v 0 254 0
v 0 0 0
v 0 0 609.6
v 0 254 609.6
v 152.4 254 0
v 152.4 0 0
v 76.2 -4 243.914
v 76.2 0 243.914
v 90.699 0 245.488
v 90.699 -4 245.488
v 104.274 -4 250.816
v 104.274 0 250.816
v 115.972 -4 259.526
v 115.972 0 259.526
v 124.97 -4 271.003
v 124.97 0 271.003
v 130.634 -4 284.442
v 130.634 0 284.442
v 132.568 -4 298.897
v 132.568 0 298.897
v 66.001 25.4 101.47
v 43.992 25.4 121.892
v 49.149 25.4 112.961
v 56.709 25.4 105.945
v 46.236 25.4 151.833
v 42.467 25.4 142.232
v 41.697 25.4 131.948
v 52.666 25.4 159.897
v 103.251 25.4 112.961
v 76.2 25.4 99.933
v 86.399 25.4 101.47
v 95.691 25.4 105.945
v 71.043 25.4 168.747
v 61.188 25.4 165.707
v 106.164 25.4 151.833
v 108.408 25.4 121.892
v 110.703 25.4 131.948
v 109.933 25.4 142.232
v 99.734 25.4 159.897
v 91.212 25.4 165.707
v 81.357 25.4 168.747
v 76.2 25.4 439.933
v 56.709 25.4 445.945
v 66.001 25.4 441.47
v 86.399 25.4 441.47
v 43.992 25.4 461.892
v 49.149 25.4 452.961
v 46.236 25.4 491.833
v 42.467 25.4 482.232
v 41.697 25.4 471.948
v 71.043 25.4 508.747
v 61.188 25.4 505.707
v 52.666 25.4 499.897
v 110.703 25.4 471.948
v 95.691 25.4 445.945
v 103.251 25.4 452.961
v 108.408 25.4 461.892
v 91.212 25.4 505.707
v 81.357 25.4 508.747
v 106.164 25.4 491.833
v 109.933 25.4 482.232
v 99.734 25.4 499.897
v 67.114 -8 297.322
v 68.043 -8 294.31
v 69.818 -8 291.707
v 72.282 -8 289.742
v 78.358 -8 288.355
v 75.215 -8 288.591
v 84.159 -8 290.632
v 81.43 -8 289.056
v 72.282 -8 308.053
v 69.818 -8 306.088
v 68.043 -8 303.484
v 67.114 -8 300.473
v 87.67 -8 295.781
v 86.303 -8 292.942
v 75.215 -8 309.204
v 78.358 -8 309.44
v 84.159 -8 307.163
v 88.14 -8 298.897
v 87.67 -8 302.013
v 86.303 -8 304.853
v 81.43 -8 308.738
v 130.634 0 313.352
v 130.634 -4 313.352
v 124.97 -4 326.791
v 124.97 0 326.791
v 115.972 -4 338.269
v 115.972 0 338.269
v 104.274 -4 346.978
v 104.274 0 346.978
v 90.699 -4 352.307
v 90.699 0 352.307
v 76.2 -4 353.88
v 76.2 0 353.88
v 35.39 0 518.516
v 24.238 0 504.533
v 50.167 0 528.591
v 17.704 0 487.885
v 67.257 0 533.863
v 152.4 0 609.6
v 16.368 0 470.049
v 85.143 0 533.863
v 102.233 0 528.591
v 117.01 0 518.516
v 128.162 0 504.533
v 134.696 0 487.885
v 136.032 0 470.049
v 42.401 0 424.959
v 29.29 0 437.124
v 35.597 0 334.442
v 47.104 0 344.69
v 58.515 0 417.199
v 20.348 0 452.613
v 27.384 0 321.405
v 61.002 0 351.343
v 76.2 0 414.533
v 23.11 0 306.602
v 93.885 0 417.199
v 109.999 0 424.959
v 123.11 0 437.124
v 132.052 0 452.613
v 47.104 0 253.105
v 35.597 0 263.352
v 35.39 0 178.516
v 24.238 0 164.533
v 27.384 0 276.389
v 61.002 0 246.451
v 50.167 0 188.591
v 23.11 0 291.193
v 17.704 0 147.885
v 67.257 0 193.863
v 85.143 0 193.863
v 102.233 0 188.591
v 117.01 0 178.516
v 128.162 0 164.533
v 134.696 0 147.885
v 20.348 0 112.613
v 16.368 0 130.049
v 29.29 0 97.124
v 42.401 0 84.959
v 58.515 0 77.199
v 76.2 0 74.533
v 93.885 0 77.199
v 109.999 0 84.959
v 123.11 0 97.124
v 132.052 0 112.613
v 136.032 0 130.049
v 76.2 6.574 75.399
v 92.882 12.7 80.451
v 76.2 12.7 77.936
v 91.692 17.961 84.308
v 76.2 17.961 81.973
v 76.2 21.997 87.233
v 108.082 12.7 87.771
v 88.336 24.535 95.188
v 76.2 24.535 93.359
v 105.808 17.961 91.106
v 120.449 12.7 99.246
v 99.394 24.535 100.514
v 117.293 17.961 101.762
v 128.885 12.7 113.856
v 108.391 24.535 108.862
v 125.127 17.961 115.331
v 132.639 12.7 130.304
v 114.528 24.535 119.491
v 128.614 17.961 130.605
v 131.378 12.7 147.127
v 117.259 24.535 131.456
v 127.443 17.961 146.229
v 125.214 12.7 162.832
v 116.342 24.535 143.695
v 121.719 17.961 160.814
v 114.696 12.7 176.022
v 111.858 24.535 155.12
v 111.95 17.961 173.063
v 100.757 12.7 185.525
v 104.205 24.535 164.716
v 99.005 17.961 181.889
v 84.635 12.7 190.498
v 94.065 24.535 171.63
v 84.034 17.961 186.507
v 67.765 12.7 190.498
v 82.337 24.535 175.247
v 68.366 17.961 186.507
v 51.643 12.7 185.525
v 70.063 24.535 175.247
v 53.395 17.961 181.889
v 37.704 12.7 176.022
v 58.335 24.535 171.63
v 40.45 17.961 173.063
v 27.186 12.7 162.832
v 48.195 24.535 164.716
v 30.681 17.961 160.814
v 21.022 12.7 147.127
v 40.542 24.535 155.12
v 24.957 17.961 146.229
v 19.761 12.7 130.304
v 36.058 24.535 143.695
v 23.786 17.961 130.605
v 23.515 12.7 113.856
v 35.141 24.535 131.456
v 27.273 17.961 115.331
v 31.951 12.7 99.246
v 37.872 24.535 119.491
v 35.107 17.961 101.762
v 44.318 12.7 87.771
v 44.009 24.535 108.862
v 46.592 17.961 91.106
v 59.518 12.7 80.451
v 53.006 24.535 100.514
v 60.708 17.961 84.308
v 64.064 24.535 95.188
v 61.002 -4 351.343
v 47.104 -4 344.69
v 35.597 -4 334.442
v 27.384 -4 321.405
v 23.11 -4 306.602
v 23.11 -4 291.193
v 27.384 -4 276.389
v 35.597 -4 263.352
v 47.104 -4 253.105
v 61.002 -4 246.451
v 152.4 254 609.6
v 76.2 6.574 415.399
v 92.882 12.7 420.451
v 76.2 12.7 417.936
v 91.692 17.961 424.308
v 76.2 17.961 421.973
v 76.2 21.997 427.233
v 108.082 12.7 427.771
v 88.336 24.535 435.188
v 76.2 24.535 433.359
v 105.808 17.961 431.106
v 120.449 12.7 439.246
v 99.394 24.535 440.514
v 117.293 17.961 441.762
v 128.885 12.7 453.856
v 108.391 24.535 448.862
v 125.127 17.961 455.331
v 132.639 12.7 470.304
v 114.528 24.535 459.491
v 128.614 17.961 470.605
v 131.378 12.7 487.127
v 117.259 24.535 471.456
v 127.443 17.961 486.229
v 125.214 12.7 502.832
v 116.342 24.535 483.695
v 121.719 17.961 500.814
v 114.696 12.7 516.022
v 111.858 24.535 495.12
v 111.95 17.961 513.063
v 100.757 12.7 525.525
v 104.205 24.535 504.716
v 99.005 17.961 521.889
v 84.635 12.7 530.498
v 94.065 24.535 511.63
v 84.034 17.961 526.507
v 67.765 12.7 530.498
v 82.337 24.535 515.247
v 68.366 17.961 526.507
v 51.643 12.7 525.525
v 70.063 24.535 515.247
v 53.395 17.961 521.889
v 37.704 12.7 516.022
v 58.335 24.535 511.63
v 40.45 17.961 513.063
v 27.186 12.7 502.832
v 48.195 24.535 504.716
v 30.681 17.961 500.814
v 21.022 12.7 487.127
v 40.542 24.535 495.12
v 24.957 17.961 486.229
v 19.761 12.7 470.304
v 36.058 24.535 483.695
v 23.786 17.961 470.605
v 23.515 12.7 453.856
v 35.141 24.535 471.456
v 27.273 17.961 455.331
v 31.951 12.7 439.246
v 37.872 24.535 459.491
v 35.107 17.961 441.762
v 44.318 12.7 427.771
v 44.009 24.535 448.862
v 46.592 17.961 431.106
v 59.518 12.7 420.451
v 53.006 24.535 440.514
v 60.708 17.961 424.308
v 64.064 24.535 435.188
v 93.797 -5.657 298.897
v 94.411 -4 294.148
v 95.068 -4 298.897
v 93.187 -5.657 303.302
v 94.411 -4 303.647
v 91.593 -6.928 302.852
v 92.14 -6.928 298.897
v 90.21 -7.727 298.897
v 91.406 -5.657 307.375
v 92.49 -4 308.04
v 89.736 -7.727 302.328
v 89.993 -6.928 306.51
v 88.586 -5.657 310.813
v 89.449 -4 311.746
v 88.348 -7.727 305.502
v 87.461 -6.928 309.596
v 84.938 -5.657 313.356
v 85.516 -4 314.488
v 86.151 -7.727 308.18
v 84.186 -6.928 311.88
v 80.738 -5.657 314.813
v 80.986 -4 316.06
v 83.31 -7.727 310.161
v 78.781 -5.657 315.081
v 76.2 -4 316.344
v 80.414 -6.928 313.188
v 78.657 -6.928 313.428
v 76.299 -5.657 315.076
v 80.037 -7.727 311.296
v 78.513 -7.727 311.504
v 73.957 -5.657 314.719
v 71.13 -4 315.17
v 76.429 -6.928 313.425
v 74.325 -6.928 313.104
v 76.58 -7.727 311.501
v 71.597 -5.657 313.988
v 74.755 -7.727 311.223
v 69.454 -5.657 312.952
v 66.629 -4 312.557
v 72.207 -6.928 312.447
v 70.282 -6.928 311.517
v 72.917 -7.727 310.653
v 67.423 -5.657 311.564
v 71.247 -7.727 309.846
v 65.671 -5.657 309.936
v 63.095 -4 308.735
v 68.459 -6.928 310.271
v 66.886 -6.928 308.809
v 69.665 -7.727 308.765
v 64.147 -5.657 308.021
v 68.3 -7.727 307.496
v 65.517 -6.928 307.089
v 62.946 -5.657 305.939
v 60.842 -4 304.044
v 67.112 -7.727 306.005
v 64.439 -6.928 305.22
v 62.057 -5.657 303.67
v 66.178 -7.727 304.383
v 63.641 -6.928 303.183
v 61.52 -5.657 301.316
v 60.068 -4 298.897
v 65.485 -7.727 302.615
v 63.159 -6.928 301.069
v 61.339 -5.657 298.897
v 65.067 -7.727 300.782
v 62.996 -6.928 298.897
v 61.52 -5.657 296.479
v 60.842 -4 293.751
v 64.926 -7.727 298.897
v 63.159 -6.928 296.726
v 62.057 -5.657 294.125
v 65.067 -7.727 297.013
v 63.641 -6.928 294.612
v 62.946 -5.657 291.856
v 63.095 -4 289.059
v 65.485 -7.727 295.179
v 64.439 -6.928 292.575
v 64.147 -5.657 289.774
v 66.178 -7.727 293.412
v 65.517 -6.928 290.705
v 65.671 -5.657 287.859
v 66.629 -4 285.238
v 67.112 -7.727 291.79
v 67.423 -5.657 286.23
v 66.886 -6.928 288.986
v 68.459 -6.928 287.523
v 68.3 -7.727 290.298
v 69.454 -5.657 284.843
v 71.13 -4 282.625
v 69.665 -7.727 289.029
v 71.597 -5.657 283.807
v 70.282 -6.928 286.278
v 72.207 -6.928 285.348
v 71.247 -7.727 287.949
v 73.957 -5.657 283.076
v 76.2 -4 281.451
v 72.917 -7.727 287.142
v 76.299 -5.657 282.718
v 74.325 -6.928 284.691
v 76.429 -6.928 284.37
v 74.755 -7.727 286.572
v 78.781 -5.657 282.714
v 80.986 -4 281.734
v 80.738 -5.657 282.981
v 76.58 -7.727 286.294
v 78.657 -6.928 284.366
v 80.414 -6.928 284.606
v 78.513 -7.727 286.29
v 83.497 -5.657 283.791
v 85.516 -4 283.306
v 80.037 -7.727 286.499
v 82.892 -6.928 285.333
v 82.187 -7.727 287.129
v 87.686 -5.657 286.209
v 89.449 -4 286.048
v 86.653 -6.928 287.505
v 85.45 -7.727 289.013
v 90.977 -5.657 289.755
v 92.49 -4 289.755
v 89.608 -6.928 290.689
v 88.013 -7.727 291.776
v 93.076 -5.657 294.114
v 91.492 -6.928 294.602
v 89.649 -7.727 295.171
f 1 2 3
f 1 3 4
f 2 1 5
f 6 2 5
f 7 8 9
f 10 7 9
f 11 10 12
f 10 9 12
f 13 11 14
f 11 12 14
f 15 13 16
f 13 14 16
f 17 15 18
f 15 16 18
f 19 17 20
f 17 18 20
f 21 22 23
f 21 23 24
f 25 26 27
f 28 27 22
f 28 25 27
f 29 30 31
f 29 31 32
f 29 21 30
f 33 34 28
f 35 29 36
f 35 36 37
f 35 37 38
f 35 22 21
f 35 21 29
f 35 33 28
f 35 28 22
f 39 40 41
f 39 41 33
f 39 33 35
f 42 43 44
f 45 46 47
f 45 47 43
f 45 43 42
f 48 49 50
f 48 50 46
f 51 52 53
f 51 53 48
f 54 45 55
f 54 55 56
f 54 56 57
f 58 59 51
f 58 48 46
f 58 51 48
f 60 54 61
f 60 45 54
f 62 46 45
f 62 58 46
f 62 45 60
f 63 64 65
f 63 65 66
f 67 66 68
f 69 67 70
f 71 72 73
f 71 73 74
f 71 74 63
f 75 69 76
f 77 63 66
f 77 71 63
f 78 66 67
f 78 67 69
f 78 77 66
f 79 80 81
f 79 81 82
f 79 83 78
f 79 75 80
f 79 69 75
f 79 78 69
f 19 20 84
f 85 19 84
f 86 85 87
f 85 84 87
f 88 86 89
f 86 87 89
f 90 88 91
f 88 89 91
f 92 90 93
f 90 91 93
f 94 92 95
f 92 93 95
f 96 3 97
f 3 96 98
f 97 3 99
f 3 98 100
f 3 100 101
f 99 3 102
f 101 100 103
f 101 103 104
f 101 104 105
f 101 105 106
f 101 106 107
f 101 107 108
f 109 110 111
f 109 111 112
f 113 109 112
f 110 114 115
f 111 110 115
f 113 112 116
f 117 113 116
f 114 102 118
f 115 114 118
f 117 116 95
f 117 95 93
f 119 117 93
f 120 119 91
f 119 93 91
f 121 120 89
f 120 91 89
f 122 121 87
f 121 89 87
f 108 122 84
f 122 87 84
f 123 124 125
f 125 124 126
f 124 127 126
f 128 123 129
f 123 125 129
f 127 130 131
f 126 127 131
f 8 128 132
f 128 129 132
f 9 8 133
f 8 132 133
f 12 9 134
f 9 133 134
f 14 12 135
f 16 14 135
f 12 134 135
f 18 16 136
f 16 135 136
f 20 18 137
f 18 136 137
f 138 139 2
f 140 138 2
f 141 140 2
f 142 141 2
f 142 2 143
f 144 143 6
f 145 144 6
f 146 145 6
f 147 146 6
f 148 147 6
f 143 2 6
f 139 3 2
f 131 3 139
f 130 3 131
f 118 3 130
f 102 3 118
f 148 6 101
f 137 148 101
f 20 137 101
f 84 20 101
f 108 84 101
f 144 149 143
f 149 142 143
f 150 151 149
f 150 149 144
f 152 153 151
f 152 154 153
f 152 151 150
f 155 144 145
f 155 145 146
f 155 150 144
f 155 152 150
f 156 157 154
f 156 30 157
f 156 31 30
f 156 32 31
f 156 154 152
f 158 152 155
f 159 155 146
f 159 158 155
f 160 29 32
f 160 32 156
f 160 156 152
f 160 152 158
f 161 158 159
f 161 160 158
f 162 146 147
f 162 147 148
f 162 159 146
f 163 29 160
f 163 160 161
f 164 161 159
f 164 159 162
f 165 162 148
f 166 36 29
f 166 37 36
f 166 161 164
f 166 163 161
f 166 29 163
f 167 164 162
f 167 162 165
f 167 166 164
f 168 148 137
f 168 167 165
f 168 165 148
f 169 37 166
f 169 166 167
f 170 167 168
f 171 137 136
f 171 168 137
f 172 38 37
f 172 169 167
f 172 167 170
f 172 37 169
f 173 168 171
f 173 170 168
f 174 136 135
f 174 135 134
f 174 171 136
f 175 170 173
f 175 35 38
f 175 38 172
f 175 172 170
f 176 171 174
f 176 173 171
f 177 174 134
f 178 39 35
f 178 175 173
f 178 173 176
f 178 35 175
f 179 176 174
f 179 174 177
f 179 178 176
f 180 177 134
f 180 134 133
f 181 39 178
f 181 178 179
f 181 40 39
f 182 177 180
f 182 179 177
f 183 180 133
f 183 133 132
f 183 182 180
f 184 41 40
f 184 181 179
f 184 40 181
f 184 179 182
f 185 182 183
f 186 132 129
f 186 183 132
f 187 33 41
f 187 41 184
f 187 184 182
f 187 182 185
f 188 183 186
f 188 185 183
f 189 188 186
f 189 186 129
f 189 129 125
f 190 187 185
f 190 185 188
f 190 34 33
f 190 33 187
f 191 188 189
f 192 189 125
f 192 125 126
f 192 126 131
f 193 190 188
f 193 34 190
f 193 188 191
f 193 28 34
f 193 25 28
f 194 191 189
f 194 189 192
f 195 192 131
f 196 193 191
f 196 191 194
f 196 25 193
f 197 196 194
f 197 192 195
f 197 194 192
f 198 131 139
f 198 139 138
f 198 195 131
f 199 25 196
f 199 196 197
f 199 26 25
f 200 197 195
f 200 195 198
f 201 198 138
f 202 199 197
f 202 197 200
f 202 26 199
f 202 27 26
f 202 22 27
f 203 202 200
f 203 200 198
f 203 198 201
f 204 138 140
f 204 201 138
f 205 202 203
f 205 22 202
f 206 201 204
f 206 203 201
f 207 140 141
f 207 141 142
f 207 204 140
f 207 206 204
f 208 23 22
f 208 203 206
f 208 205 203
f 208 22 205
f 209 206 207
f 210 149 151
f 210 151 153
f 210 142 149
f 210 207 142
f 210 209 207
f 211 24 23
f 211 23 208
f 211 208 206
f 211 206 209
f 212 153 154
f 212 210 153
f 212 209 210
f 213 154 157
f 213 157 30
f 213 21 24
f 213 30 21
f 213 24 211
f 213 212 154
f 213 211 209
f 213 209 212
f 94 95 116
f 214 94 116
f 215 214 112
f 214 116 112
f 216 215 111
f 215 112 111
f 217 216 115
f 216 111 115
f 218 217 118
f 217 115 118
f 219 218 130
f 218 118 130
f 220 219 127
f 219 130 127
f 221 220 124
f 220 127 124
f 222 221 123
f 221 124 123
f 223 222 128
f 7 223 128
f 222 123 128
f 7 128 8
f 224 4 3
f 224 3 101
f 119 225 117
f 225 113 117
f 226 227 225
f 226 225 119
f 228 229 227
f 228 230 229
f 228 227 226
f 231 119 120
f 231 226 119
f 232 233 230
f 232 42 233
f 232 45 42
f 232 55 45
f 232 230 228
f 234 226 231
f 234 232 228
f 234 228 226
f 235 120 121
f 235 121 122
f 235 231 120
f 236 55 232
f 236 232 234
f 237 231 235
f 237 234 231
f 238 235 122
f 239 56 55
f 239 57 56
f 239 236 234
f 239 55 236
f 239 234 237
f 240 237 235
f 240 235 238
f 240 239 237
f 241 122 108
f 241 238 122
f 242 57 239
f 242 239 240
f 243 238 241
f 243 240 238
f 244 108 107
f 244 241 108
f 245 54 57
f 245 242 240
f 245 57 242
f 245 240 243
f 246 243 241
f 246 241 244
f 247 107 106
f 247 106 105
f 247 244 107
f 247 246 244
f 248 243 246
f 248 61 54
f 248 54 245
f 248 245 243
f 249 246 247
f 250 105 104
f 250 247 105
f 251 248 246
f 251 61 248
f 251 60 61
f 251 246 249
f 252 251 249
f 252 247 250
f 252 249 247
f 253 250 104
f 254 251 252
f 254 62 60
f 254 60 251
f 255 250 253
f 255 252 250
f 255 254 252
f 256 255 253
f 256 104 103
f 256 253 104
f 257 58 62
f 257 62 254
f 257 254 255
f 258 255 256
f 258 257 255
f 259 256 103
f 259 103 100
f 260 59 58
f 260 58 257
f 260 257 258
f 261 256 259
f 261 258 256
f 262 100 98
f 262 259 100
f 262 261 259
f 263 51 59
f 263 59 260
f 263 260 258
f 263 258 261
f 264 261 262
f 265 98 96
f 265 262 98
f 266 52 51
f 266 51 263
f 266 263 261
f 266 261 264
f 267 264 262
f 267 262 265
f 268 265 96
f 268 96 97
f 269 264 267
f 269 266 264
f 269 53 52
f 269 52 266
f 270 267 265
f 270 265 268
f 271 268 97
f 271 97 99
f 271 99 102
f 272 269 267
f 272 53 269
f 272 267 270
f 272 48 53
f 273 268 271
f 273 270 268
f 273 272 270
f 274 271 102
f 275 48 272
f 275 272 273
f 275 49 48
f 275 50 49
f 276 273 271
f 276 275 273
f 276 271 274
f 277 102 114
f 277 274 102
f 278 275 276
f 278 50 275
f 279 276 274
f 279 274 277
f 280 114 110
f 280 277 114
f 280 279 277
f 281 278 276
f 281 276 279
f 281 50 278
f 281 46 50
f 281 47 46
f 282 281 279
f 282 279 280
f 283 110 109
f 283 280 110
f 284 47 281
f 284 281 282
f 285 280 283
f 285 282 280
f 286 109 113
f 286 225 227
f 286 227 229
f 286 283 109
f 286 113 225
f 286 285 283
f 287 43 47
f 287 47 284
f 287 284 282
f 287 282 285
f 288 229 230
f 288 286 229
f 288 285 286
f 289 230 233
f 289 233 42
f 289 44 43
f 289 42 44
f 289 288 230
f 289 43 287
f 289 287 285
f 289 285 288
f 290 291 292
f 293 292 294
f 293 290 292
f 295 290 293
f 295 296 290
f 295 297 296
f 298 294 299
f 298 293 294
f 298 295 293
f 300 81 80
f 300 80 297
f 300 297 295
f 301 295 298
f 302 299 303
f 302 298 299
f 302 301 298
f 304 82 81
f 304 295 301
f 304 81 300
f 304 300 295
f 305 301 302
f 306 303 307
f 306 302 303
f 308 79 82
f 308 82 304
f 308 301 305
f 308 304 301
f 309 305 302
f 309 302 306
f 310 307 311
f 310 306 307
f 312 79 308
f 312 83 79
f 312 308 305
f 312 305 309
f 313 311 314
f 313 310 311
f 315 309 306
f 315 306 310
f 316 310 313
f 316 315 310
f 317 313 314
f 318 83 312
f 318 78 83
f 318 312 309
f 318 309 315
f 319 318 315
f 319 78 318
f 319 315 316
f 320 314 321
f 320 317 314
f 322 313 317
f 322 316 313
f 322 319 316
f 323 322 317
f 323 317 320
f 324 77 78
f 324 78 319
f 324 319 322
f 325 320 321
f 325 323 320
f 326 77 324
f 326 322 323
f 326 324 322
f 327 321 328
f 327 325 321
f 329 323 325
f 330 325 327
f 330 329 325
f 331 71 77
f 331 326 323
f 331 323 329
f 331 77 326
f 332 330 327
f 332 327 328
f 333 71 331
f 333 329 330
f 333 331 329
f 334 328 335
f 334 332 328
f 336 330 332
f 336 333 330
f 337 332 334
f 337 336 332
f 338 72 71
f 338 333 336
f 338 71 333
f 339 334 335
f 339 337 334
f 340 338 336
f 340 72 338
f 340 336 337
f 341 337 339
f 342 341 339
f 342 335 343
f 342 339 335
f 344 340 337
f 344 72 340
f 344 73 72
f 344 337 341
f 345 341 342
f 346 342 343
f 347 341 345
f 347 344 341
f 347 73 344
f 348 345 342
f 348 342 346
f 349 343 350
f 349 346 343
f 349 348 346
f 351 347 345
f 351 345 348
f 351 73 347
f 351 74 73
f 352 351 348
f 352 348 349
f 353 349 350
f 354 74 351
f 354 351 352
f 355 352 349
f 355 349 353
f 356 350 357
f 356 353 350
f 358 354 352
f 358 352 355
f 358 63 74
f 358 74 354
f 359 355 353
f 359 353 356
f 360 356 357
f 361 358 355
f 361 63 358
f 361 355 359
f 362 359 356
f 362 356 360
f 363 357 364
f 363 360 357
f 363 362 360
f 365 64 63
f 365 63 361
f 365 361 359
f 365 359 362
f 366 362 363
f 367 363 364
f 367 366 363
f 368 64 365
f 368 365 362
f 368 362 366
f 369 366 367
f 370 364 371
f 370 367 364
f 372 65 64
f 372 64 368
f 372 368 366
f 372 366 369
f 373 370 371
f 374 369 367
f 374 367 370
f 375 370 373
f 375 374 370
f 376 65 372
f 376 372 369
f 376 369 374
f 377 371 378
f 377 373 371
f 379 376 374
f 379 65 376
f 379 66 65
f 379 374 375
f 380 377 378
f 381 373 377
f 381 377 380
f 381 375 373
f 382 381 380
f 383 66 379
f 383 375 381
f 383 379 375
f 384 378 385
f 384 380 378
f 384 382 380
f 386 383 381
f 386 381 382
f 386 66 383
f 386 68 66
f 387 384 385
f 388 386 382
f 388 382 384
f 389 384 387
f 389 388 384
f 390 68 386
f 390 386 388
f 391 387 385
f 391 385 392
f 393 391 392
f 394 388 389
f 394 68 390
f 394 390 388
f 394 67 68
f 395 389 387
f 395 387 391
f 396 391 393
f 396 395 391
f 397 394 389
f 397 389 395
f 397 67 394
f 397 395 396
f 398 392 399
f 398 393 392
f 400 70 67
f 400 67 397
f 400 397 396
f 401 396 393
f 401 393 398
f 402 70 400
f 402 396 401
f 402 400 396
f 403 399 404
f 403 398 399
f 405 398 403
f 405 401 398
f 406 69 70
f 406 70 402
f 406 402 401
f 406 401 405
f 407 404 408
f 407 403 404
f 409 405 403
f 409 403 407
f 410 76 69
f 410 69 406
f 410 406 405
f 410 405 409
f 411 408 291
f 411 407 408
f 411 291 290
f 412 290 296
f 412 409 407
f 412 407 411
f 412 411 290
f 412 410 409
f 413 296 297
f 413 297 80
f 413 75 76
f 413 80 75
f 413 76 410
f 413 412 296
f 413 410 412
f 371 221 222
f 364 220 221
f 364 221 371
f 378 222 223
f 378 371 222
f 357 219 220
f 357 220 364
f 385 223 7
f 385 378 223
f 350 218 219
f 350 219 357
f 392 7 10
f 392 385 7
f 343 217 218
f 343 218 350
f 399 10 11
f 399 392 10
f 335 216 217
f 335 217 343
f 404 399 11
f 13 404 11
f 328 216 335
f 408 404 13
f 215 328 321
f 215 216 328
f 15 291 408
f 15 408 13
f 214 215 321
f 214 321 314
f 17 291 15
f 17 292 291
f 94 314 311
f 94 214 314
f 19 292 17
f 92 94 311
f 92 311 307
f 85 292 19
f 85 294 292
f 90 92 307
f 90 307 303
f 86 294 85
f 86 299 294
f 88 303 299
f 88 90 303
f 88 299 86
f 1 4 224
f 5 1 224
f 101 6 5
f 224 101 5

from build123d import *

# Parameters (mm, degrees)
F0_W     = 152.4
F0_H     = 254
F1_DEPTH = 609.6
F3_DEPTH = 25.4
F4_R     = 25.39999
F5_DEPTH = 4
F6_DEPTH = 8


# Not quite as in the source:
# - a fillet or chamfer that OpenCascade refuses, or shapes differently, is made with other operations: its cross-section is extruded or revolved along the edge and cut away or added
# - a fillet or chamfer is up to 0.001 mm smaller than in the source, because OpenCascade refuses the exact size


with BuildPart() as f1:
    # F0 (on Top) → F1 (new body)
    with BuildSketch(Plane.XY):
        with Locations((76.2, 127)):
            Rectangle(F0_W, F0_H)
    extrude(amount=F1_DEPTH)

    # F2 (on face) → F3 (cut)
    with BuildSketch(Plane.XZ):
        with BuildLine():
            Line((76.2, 414.5332613452), (76.2, 534.5332613452))
            ThreePointArc((76.2, 534.5332613452), (16.2, 474.5332613452), (76.2, 414.5332613452))
        make_face()
        with BuildLine():
            ThreePointArc((76.2, 414.5332613452), (118.6264068712, 432.106854474), (136.2, 474.5332613452))
            ThreePointArc((136.2, 474.5332613452), (118.6264068712, 516.9596682164), (76.2, 534.5332613452))
            Line((76.2, 534.5332613452), (76.2, 414.5332613452))
        make_face()
        with BuildLine():
            Line((76.2, 74.5332613452), (76.2, 194.5332613452))
            ThreePointArc((76.2, 194.5332613452), (16.2, 134.5332613452), (76.2, 74.5332613452))
        make_face()
        with BuildLine():
            ThreePointArc((136.2, 134.5332613452), (118.6264068712, 176.9596682164), (76.2, 194.5332613452))
            Line((76.2, 194.5332613452), (76.2, 74.5332613452))
            ThreePointArc((76.2, 74.5332613452), (118.6264068712, 92.106854474), (136.2, 134.5332613452))
        make_face()
    extrude(amount=-F3_DEPTH, mode=Mode.SUBTRACT)

    # F4 (radius 25.4 in the source; OpenCascade refuses exactly that, so slightly less here)
    f4_edges = [f1.edges().sort_by_distance(p)[0] for p in [
        (76.2, 25.4, 534.533261),
        (76.2, 25.4, 194.533261),
    ]]
    fillet(f4_edges, radius=F4_R)

    # F2 (on face) → F5 (join)
    with BuildSketch(Plane.XZ):
        with BuildLine():
            ThreePointArc((132.5678679347, 298.8973259926), (115.9720816592, 338.2688432126), (76.2, 353.8803137007))
            Line((76.2, 353.8803137007), (76.2, 316.3437851552))
            ThreePointArc((76.2, 316.3437851552), (89.4487835379, 311.7462109414), (95.0678679347, 298.8973259926))
            ThreePointArc((95.0678679347, 298.8973259926), (89.4487835379, 286.0484410437), (76.2, 281.45086683))
            Line((76.2, 281.45086683), (76.2, 243.9143382844))
            ThreePointArc((76.2, 243.9143382844), (115.9720816592, 259.5258087726), (132.5678679347, 298.8973259926))
        make_face()
        with BuildLine():
            Line((76.2, 316.3437851552), (76.2, 353.8803137007))
            ThreePointArc((76.2, 353.8803137007), (22.5678679347, 298.8973259926), (76.2, 243.9143382844))
            Line((76.2, 243.9143382844), (76.2, 281.45086683))
            ThreePointArc((76.2, 281.45086683), (60.0678679347, 298.8973259926), (76.2, 316.3437851552))
        make_face()
    extrude(amount=F5_DEPTH)

    # F2 (on face) → F6 (join)
    with BuildSketch(Plane.XZ):
        with BuildLine():
            ThreePointArc((95.0678679347, 298.8973259926), (89.4487835379, 311.7462109414), (76.2, 316.3437851552))
            Line((76.2, 316.3437851552), (76.2, 281.45086683))
            ThreePointArc((76.2, 281.45086683), (89.4487835379, 286.0484410437), (95.0678679347, 298.8973259926))
        make_face()
        with BuildLine():
            Line((76.2, 281.45086683), (76.2, 316.3437851552))
            ThreePointArc((76.2, 316.3437851552), (60.0678679347, 298.8973259926), (76.2, 281.45086683))
        make_face()
    extrude(amount=F6_DEPTH)

    # F7: fillet of radius 8 on 1 edges, made by hand

    # F7_s1 → F7_t2 (revolve, cut)
    with BuildSketch(Plane.XY.offset(298.8973259926)):
        with BuildLine():
            ThreePointArc((95.0678679347, -4), (92.1396647044, -6.9282032303), (88.1396647044, -8))
            Line((88.1396647044, -8), (95.0678679347, -8))
            Line((95.0678679347, -8), (95.0678679347, -4))
        make_face()
    revolve(axis=Axis((77.5678679347, -8, 298.8973259926), (0, -1, 0)), mode=Mode.SUBTRACT)


solid = f1.part
